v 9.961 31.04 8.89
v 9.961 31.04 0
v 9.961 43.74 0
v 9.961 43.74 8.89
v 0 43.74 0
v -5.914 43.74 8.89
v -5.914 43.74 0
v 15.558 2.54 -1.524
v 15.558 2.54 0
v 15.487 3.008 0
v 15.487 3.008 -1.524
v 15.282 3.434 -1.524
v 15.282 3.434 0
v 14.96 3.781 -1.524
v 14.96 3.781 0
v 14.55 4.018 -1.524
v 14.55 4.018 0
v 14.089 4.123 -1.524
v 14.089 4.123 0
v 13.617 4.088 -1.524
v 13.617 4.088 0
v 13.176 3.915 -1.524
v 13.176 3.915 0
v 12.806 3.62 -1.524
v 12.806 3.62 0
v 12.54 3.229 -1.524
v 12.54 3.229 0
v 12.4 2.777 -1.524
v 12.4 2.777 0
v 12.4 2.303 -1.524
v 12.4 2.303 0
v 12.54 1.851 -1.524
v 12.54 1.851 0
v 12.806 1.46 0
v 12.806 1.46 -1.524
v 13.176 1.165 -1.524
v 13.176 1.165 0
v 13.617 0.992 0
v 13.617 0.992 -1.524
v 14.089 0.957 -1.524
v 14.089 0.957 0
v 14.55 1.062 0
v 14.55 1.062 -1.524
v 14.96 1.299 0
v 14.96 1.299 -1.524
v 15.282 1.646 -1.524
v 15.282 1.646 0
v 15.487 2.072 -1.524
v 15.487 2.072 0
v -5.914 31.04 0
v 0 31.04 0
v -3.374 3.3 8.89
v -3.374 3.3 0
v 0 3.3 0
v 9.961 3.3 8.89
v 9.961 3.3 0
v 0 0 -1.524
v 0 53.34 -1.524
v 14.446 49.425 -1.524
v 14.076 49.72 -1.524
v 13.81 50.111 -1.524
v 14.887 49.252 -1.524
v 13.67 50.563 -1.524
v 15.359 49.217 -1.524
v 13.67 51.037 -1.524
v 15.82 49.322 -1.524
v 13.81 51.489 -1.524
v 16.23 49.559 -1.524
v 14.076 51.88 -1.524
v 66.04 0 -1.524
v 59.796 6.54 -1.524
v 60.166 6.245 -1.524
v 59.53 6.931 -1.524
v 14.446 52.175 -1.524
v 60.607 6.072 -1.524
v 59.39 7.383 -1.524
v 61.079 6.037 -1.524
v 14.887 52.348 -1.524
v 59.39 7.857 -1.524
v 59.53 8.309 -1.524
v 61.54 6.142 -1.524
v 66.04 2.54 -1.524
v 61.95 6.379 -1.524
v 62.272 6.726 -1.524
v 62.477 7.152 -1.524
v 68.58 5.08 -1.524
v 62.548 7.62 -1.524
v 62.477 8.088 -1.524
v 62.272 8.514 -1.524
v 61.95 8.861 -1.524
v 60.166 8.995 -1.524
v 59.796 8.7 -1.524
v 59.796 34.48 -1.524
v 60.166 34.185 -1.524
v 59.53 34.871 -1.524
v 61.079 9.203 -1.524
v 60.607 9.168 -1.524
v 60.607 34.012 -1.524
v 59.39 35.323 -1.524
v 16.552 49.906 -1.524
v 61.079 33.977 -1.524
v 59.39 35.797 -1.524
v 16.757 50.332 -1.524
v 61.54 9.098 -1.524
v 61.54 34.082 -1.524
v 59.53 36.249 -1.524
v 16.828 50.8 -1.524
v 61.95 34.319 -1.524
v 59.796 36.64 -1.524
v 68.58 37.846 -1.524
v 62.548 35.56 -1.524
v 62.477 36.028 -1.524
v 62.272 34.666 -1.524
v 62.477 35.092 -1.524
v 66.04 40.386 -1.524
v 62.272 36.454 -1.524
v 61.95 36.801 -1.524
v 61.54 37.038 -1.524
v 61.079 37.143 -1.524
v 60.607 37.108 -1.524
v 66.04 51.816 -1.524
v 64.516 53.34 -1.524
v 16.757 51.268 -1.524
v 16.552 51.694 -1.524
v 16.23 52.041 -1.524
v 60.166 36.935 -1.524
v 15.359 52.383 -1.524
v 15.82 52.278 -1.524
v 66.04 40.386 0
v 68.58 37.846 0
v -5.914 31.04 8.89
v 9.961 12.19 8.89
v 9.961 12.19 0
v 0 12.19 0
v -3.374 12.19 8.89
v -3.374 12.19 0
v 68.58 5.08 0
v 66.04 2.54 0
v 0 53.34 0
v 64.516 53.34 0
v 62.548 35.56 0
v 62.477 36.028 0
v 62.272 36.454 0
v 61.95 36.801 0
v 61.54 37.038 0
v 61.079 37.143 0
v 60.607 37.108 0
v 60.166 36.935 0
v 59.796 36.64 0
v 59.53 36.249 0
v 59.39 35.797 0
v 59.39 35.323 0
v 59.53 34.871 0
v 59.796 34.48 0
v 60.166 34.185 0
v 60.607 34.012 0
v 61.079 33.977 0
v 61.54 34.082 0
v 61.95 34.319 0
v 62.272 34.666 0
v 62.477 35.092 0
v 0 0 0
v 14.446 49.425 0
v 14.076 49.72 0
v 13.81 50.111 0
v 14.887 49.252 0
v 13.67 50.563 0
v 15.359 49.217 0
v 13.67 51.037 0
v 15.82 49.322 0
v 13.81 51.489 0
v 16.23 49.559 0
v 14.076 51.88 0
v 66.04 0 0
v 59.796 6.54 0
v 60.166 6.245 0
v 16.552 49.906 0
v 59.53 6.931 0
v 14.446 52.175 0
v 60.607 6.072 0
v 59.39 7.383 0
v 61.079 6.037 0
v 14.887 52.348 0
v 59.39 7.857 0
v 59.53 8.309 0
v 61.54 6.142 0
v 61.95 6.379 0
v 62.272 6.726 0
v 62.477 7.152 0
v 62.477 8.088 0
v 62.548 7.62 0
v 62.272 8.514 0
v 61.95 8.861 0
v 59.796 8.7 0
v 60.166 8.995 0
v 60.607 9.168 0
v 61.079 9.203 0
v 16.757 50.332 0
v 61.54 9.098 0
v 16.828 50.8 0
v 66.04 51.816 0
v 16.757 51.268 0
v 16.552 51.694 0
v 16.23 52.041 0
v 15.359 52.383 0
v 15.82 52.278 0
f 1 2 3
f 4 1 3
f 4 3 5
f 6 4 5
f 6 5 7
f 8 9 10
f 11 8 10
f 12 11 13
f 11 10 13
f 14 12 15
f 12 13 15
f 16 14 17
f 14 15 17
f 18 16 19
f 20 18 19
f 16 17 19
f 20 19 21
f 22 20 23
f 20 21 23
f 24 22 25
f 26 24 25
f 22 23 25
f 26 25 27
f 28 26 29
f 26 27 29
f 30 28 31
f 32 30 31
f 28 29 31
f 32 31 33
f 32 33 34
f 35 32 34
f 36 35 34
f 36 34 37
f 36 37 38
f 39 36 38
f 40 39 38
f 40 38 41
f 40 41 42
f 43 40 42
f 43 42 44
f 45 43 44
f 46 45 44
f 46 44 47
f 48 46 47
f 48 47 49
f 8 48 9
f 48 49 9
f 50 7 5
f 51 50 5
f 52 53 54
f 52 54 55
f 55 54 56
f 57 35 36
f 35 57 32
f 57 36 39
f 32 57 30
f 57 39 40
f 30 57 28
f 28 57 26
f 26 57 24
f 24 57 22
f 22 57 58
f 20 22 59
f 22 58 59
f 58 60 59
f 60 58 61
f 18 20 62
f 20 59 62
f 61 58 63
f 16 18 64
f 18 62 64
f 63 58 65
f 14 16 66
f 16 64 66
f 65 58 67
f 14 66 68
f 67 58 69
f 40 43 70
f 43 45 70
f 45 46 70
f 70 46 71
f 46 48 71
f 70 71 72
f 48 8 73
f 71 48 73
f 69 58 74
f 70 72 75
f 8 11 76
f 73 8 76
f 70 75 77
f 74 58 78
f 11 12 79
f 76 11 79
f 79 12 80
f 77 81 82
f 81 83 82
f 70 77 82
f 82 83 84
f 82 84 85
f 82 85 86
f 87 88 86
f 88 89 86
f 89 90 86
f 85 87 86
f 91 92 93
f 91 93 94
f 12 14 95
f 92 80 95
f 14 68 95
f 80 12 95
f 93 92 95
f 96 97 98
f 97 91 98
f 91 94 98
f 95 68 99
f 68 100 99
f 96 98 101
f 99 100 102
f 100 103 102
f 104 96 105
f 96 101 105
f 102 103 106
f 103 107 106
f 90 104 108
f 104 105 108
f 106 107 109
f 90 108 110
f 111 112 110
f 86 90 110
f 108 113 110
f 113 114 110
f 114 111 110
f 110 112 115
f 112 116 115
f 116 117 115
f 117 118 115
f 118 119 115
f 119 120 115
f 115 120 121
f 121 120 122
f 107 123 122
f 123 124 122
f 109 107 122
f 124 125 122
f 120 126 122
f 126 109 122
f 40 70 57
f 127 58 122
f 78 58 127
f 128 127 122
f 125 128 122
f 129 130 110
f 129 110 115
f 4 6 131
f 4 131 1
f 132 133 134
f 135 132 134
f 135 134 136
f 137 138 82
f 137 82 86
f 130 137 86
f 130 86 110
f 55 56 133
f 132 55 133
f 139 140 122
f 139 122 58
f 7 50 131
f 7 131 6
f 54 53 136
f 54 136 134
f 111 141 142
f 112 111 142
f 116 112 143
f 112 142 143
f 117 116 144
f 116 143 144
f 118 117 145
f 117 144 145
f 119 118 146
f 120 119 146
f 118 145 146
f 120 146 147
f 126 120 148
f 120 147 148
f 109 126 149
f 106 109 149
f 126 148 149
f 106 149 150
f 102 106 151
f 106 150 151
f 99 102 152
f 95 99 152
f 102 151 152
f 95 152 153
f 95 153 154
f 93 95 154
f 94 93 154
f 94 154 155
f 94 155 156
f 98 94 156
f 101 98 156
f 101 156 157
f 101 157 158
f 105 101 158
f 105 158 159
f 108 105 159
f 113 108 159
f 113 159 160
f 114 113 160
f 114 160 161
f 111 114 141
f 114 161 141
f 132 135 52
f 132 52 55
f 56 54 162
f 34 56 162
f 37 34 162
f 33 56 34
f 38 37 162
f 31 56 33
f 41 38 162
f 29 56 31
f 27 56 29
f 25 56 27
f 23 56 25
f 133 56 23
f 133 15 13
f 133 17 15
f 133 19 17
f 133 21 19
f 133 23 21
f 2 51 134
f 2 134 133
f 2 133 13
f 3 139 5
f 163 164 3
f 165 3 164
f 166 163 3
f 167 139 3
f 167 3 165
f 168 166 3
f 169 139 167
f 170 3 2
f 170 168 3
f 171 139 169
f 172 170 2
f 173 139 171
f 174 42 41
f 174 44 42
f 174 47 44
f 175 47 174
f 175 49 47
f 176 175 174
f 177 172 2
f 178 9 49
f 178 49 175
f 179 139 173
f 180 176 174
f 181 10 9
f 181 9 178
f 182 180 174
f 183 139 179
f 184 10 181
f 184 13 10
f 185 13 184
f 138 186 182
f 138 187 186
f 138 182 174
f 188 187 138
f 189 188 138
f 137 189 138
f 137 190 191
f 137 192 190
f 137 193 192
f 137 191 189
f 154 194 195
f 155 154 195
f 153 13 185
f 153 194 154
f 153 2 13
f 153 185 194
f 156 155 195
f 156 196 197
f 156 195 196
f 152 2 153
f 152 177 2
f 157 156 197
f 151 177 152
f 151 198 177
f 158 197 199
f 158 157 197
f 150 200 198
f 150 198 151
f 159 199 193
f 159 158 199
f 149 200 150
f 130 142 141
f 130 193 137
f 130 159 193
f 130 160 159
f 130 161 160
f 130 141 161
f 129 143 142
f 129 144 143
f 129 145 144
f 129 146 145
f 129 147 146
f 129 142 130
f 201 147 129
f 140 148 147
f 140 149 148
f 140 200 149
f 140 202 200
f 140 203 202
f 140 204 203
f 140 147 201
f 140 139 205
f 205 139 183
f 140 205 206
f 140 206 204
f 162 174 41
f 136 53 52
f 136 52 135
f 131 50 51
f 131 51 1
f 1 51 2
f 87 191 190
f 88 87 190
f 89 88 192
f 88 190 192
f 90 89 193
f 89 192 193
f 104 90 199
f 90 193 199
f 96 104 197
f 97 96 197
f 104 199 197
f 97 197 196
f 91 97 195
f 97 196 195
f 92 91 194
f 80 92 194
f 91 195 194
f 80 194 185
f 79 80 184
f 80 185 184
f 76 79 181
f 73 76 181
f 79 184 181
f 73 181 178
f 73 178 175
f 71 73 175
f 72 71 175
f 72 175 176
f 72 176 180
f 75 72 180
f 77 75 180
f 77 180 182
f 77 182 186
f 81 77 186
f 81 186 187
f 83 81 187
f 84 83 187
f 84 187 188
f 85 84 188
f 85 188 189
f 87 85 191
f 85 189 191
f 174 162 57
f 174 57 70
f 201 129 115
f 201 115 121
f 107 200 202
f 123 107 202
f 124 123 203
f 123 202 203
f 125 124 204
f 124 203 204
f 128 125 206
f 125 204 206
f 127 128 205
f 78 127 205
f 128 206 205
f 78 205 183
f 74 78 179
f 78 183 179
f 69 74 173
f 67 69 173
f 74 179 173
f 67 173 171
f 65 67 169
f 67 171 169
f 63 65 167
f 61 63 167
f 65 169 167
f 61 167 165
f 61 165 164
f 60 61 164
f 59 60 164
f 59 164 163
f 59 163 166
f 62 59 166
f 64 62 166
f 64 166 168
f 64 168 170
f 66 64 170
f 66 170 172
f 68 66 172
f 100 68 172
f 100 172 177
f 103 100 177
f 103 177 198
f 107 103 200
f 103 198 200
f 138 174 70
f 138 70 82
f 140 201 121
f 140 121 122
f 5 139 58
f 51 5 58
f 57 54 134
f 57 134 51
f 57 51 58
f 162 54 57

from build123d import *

# Parameters (mm, degrees)
F0_R     = 1.5875
F1_DEPTH = 1.524
F2_W     = 5.913735792
F2_H     = 12.7
F2_W_2   = 9.961264208
F2_W_3   = 3.373735792
F2_H_2   = 8.89
F3_DEPTH = 8.89


# Not quite as in the source:
# - a feature names something its author has since deleted; it is built from what else it names


with BuildPart() as f1:
    # F0 (on Top) → F1 (new body)
    with BuildSketch(Plane.XY):
        Polygon((0, 53.34), (0, 0), (66.04, 0), (66.04, 2.54), (68.58, 5.08), (68.58, 37.846), (66.04, 40.386), (66.04, 51.816), (64.516, 53.34), align=None)
        with Locations((13.97, 2.54)):
            Circle(F0_R, mode=Mode.SUBTRACT)
        with Locations((60.96, 7.62)):
            Circle(F0_R, mode=Mode.SUBTRACT)
        with Locations((15.24, 50.8)):
            Circle(F0_R, mode=Mode.SUBTRACT)
        with Locations((60.96, 35.56)):
            Circle(F0_R, mode=Mode.SUBTRACT)
    extrude(amount=-F1_DEPTH)

    # F2 (on face) → F3 (join)
    with BuildSketch(Plane.XY):
        with Locations((-2.956867896, 37.39)):
            Rectangle(F2_W, F2_H)
        with Locations((4.980632104, 37.39)):
            Rectangle(F2_W_2, F2_H)
        with Locations((-1.686867896, 7.745)):
            Rectangle(F2_W_3, F2_H_2)
        with Locations((4.980632104, 7.745)):
            Rectangle(F2_W_2, F2_H_2)
    extrude(amount=F3_DEPTH)


solid = f1.part
